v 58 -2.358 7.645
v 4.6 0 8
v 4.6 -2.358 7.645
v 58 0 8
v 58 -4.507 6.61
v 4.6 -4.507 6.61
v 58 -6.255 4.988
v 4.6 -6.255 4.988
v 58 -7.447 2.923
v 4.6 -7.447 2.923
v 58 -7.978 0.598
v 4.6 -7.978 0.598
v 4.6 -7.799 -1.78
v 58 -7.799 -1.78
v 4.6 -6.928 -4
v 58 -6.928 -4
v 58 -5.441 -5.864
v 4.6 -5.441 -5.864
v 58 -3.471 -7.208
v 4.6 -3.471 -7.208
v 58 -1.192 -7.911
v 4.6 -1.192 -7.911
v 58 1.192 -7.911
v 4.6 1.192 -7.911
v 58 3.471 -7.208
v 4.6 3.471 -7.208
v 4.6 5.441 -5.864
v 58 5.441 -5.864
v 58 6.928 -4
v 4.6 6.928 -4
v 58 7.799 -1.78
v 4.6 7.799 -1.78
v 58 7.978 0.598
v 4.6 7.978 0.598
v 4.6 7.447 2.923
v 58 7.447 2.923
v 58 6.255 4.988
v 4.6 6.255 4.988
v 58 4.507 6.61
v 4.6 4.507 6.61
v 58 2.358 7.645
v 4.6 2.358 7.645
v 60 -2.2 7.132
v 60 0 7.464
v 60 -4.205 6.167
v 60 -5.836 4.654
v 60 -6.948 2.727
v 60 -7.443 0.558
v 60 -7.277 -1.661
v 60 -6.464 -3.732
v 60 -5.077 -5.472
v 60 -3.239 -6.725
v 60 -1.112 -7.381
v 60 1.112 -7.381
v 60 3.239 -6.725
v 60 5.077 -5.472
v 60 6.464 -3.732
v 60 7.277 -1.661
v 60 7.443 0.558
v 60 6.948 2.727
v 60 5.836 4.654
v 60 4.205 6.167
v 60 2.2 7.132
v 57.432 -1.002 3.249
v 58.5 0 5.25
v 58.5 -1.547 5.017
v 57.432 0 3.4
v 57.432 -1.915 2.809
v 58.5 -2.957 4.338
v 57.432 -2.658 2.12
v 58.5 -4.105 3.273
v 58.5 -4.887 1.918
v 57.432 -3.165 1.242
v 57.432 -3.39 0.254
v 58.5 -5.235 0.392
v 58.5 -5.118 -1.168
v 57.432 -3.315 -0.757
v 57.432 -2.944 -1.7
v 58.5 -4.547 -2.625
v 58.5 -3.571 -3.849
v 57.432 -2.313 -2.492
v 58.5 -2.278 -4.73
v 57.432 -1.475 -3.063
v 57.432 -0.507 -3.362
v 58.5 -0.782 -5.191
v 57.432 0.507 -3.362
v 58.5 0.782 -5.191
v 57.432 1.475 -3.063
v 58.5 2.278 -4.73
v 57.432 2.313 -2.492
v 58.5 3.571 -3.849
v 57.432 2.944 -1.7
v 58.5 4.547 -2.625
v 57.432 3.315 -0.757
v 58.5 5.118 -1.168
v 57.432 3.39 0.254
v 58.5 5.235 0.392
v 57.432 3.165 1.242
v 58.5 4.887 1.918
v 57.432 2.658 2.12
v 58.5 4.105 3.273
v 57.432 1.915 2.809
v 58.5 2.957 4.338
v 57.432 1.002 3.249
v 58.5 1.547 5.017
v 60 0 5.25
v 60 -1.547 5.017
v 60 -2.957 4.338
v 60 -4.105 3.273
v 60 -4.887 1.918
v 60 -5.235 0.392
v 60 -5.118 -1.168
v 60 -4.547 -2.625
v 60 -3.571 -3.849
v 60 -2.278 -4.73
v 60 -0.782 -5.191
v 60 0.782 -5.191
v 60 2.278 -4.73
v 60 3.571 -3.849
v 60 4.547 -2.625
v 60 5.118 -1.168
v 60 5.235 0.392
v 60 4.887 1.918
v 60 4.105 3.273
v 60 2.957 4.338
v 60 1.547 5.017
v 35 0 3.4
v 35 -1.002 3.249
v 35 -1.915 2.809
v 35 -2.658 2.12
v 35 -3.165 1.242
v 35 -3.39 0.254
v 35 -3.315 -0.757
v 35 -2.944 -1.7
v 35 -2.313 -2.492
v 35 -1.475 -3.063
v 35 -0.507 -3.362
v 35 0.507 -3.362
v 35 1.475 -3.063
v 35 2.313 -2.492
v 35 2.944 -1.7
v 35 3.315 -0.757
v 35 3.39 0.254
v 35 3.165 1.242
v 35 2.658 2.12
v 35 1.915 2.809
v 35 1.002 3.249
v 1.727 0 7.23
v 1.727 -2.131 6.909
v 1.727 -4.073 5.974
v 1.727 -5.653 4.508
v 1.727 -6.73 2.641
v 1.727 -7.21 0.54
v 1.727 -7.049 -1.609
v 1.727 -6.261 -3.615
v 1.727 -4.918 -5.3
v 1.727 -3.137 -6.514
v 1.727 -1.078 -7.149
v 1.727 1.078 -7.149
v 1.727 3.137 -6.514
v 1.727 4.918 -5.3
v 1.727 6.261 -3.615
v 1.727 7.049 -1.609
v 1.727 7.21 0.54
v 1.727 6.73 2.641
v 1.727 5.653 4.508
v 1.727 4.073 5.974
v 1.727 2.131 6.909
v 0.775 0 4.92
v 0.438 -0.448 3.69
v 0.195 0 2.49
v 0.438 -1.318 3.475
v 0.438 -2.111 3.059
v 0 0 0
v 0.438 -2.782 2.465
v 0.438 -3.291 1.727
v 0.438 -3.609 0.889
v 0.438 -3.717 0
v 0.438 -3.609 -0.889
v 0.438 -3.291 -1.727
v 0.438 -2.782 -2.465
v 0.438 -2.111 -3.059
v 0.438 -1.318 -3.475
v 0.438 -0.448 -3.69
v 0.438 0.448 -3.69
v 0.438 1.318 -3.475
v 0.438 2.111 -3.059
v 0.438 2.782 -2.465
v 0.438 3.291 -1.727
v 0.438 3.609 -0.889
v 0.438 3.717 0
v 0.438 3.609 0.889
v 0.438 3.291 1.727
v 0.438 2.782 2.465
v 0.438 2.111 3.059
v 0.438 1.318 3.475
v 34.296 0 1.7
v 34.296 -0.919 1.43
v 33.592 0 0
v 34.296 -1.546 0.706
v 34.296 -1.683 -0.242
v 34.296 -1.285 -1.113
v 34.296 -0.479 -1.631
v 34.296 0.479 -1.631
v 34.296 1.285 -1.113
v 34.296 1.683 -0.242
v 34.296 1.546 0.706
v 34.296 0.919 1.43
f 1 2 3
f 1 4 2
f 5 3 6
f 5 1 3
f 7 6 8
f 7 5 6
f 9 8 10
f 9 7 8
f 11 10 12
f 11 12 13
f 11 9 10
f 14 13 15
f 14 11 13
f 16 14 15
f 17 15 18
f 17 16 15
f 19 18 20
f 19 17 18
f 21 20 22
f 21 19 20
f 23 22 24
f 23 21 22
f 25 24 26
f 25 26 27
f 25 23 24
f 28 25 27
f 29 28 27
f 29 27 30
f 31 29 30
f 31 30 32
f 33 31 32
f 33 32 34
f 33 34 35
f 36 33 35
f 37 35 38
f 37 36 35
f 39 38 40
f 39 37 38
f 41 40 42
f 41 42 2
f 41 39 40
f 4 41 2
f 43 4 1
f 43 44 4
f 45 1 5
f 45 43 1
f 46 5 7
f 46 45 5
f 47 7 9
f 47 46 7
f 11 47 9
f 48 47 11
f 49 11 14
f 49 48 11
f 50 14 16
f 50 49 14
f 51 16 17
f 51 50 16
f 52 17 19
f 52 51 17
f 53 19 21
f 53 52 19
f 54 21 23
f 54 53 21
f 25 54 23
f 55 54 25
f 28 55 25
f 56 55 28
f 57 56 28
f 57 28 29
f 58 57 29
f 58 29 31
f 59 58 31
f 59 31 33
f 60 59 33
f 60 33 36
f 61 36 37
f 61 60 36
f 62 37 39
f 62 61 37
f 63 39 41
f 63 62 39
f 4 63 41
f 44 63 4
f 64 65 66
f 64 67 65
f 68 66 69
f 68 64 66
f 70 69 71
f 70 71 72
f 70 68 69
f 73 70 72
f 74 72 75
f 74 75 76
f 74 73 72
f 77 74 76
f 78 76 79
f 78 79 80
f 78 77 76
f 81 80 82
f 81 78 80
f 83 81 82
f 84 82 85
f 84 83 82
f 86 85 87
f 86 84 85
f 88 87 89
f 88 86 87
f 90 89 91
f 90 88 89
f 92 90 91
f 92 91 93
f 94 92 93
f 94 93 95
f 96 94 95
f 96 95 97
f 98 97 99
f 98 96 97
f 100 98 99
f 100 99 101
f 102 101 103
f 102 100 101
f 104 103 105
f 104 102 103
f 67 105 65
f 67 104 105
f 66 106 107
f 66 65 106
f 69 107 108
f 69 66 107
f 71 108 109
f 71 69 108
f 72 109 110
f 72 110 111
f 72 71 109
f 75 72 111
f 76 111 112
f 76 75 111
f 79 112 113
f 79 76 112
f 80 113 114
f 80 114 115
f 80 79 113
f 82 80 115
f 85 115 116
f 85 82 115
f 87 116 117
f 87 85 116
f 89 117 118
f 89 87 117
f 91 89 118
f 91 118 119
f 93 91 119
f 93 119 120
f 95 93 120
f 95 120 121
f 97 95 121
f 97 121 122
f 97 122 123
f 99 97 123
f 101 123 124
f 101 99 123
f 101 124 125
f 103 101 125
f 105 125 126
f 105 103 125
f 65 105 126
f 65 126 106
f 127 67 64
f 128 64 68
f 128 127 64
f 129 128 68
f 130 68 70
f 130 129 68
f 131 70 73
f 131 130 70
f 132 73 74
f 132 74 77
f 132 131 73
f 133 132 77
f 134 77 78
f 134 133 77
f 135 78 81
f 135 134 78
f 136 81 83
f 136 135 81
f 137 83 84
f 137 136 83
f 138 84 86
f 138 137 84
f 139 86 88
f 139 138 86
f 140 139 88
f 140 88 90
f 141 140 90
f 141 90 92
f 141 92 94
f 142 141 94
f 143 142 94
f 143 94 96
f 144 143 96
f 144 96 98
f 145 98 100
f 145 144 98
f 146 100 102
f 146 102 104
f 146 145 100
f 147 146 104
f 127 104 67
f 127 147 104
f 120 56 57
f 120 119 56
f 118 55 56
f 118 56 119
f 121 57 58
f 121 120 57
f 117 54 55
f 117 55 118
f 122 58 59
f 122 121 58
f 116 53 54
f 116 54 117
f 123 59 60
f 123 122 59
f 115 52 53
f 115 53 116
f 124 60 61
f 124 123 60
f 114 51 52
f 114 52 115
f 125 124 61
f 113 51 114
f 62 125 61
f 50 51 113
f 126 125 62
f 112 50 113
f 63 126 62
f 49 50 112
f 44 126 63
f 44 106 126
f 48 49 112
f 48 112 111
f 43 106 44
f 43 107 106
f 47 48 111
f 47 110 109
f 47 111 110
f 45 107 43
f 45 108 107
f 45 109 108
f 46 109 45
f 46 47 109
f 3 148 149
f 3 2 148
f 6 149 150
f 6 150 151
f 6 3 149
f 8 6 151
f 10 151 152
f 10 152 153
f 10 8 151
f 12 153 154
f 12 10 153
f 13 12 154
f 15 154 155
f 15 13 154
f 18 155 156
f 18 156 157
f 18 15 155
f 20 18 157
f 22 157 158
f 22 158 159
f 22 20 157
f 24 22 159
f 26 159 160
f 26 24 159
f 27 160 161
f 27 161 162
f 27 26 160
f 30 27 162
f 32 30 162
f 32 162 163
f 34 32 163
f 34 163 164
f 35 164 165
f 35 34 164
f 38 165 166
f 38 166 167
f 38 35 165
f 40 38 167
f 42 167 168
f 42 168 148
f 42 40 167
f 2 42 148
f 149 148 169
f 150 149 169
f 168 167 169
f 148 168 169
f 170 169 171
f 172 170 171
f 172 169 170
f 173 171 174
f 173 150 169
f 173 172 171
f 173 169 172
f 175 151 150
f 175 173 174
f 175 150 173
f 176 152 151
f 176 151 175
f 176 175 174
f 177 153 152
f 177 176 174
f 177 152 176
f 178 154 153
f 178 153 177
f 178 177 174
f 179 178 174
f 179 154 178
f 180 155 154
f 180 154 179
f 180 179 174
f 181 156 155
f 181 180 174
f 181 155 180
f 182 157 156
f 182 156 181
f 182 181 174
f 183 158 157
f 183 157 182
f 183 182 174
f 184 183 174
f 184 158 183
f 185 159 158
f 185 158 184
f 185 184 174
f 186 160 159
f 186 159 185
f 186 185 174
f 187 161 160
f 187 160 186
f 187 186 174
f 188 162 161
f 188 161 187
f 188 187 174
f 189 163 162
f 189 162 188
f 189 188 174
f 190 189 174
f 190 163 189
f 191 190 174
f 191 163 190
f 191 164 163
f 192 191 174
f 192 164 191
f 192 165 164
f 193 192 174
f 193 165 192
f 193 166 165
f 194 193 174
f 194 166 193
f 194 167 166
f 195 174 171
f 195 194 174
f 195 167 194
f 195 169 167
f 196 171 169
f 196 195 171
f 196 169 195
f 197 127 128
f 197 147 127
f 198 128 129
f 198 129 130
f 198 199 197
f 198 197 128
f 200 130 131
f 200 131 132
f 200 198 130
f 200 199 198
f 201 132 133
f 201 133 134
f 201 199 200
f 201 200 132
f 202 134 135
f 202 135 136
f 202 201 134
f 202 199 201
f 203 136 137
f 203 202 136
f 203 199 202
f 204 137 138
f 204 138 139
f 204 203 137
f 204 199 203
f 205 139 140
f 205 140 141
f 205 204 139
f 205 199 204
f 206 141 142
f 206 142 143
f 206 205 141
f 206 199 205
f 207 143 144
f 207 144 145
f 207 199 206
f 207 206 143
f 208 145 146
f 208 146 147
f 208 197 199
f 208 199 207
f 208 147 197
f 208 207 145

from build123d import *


with BuildPart() as part:
    # BodySke → Body (revolve)
    with BuildSketch(Plane.XY, mode=Mode.PRIVATE) as body_sk:
        with BuildLine():
            Line((4.6, 8), (58, 8))
            Line((58, 8), (60, 7.464101615))
            Line((60, 7.464101615), (60, 5.25))
            Line((60, 5.25), (58.5, 5.25))
            Line((58.5, 5.25), (57.431902002, 3.4))
            Line((57.431902002, 3.4), (35, 3.4))
            Line((35, 3.4), (33.591673888, 0))
            Line((33.591673888, 0), (0, 0))
            ThreePointArc((0, 0), (0.437676073, 3.716728939), (1.726759251, 7.230117462))
            Line((1.726759251, 7.230117462), (4.6, 8))
        make_face()
    revolve(body_sk.sketch.rotate(Axis((0, 0, 0), (1, 0, 0)), 90), axis=Axis((0, 0, 0), (1, 0, 0)))


solid = part.part
